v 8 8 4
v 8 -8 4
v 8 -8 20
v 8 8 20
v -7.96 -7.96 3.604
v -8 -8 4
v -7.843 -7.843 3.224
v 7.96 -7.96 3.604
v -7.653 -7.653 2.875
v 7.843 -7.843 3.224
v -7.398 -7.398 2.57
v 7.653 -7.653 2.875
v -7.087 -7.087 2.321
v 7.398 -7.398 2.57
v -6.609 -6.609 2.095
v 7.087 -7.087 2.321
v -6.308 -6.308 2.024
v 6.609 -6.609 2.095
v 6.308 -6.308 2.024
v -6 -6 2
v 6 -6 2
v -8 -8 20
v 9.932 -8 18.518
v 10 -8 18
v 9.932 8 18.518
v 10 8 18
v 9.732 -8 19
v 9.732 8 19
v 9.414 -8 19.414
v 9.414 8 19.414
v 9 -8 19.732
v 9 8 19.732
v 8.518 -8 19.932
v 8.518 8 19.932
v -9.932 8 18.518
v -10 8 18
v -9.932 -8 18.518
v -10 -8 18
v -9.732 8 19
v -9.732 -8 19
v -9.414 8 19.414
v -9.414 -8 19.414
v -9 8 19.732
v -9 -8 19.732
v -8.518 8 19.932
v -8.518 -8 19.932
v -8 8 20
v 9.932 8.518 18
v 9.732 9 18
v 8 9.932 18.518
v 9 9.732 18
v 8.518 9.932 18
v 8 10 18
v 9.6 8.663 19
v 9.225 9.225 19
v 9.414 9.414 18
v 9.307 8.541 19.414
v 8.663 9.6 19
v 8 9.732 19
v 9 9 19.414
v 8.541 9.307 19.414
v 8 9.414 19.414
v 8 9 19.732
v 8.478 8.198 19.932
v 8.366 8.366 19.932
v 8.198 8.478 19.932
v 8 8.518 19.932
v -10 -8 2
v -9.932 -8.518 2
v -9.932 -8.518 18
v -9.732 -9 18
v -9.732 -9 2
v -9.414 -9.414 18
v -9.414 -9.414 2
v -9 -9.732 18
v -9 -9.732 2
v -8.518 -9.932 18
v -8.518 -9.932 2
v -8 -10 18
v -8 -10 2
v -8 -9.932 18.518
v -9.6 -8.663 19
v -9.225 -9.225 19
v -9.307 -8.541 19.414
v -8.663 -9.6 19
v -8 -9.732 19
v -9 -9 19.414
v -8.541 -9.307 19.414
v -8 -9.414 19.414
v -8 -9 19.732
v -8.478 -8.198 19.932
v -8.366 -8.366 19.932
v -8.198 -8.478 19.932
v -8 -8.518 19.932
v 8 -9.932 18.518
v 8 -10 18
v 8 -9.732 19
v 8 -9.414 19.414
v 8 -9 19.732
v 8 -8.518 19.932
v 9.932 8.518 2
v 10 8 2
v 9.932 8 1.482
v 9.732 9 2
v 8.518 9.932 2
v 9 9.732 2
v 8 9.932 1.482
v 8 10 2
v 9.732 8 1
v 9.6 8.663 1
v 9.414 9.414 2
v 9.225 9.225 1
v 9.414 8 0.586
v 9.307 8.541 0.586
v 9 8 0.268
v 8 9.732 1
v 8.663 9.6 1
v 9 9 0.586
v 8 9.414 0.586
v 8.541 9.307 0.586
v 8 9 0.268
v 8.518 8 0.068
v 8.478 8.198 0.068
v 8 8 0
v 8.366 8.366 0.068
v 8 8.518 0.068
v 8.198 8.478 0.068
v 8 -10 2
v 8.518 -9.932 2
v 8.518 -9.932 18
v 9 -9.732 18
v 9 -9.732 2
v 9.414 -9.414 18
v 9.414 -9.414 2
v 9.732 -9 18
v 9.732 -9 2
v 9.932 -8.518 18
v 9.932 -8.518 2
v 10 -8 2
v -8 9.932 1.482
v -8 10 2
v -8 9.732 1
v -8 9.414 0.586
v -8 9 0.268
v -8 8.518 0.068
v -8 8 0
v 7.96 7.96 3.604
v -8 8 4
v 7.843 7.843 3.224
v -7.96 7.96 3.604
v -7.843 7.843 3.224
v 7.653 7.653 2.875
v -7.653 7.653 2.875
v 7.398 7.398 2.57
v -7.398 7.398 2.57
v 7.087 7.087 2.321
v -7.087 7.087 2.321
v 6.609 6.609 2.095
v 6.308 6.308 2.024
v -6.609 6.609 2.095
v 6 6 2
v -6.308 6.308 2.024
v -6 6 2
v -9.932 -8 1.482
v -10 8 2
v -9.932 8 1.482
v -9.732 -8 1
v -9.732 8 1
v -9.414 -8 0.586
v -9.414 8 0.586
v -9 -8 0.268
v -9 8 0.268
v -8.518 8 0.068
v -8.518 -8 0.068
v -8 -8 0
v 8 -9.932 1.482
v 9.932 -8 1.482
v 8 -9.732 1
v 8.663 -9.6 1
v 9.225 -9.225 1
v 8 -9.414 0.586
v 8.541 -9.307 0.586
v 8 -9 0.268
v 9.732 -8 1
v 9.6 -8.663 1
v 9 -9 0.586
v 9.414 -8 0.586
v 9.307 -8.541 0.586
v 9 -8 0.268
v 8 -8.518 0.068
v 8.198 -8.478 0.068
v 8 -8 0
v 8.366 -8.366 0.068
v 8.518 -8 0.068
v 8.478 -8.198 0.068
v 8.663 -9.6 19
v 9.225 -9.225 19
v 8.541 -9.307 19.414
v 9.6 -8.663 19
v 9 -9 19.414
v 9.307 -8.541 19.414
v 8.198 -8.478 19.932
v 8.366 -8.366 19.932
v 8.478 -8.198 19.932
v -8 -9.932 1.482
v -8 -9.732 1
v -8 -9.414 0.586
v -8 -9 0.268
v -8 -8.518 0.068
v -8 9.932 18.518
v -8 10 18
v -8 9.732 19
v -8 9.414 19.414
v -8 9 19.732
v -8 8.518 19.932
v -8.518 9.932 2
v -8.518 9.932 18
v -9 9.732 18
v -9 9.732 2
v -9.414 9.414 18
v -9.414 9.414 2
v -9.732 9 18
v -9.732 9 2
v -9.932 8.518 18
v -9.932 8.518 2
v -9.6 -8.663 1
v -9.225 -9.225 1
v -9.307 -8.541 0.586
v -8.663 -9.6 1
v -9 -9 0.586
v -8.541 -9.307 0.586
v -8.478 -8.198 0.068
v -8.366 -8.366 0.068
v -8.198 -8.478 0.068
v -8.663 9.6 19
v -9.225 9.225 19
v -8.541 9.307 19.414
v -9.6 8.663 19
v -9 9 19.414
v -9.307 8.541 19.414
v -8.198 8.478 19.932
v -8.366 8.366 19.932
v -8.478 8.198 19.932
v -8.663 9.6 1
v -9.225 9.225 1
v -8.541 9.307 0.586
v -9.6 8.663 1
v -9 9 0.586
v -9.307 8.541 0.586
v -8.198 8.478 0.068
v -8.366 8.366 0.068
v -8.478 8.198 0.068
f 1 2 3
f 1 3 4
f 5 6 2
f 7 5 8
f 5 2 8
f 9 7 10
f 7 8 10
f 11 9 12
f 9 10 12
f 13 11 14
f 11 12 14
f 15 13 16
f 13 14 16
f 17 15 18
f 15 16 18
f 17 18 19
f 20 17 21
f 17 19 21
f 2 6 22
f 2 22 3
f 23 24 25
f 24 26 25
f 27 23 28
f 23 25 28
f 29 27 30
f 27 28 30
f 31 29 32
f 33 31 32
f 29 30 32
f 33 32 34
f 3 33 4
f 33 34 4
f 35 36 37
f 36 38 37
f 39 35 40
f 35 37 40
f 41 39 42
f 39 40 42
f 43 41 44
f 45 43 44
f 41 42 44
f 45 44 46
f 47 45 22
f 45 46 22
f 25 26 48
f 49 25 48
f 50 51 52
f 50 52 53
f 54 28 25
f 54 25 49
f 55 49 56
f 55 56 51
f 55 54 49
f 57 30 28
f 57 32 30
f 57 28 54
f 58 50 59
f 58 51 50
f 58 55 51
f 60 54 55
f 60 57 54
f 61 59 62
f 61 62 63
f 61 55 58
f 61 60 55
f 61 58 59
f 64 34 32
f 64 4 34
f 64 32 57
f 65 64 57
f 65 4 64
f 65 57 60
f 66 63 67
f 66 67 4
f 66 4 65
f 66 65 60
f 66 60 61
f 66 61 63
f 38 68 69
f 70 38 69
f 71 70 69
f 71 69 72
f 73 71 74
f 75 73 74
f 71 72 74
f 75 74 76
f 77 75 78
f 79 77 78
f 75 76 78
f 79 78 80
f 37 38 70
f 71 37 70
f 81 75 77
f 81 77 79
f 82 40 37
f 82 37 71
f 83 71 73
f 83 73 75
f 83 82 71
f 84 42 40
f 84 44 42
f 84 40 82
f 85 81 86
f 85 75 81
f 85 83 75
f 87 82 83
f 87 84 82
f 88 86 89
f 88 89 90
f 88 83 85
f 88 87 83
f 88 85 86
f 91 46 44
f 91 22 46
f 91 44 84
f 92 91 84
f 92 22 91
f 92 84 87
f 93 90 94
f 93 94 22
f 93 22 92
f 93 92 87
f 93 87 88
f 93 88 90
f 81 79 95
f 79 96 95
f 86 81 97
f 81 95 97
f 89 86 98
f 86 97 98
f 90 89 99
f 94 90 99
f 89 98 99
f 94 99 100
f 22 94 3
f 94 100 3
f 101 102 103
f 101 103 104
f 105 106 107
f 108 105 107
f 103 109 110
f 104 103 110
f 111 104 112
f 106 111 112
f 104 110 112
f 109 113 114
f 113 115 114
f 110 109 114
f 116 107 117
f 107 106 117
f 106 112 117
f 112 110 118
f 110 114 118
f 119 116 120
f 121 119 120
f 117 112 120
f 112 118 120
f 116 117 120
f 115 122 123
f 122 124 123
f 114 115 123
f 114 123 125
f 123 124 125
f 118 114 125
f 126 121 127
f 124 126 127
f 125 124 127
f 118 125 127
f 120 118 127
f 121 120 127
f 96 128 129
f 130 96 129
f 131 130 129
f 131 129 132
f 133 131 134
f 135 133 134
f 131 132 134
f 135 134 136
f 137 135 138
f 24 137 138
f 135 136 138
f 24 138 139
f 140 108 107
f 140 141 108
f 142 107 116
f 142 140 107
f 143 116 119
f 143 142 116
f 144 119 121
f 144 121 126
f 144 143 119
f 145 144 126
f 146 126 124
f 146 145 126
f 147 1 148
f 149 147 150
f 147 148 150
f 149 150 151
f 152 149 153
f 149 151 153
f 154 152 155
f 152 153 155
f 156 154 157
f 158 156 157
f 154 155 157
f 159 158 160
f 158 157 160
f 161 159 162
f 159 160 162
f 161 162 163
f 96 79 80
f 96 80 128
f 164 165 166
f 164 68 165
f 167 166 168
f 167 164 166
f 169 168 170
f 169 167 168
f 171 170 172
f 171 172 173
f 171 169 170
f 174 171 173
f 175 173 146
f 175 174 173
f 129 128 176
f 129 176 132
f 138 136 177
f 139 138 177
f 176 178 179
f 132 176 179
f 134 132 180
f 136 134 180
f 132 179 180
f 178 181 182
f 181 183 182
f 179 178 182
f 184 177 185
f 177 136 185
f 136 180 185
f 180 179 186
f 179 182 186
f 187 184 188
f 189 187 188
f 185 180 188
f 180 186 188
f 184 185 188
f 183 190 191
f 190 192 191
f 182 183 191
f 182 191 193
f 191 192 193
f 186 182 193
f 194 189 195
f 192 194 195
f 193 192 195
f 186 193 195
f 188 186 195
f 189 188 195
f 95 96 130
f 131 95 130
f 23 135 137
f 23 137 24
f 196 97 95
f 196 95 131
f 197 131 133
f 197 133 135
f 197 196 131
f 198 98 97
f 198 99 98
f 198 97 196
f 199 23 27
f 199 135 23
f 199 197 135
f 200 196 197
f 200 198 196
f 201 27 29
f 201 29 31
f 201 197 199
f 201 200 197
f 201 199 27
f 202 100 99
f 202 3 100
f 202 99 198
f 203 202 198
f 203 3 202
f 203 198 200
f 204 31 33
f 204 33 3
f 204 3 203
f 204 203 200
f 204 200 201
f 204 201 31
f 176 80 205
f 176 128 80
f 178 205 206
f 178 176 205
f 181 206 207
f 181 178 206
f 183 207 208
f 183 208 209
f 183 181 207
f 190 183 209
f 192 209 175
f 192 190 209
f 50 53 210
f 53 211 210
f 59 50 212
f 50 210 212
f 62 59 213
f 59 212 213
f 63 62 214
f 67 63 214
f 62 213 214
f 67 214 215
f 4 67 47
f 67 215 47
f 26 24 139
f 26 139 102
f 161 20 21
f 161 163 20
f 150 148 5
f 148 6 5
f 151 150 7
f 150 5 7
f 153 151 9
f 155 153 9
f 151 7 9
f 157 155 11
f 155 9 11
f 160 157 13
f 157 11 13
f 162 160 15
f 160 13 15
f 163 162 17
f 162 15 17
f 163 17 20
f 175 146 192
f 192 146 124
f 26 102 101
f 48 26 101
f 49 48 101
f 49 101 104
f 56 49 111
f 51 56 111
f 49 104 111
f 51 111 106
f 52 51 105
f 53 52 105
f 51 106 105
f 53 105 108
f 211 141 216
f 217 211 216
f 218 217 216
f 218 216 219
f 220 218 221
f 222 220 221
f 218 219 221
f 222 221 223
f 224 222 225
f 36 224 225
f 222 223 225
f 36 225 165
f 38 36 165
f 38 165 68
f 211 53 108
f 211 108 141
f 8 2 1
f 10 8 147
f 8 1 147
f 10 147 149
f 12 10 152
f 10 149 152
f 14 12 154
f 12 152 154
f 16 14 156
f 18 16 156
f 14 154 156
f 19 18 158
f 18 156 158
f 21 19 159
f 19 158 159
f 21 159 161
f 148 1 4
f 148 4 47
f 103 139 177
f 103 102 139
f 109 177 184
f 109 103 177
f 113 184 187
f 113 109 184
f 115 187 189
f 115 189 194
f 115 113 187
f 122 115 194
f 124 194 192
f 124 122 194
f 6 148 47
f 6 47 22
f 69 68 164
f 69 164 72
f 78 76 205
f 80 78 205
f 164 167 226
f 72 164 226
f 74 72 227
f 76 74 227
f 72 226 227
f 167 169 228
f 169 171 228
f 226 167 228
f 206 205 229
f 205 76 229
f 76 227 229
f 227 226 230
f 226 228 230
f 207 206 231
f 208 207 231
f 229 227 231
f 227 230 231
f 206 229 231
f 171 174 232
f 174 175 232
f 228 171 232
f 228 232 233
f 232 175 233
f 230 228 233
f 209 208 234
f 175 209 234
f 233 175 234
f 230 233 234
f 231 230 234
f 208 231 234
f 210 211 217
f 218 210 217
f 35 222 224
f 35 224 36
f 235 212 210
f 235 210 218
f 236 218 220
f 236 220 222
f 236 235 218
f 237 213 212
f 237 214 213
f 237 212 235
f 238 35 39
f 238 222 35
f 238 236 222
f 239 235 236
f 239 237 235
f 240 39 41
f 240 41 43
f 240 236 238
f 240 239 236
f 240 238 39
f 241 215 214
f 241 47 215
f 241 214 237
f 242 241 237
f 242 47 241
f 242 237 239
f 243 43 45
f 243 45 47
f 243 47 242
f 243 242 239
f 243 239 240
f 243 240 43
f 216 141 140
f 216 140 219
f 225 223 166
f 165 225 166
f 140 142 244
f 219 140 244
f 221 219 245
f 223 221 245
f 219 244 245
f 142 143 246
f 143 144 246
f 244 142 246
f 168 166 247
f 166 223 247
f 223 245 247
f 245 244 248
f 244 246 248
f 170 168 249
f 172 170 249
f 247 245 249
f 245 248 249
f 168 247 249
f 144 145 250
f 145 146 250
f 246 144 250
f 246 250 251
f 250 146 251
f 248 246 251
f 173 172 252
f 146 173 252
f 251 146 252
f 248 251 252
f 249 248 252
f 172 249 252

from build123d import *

# Parameters (mm, degrees)
F1_DEPTH = 20
F3_T     = 2
F4_R     = 1.99999


# Not quite as in the source:
# - a fillet or chamfer is up to 0.001 mm smaller than in the source, because OpenCascade refuses the exact size
# - a feature of the source that left no trace in its solid (it failed there, or was rolled back) is left out
# - a shell that OpenCascade refuses in one call is made with other operations: the cavity is built on its own and cut out


with BuildPart() as f1:
    # F0 (on Top) → F1 (new body)
    with BuildSketch(Plane.XY):
        with BuildLine():
            Line((-8, -10), (8, -10))
            ThreePointArc((8, -10), (9.4142135624, -9.4142135624), (10, -8))
            Line((10, -8), (10, 8))
            ThreePointArc((10, 8), (9.4142135624, 9.4142135624), (8, 10))
            Line((8, 10), (-8, 10))
            ThreePointArc((-8, 10), (-9.4142135624, 9.4142135624), (-10, 8))
            Line((-10, 8), (-10, -8))
            ThreePointArc((-10, -8), (-9.4142135624, -9.4142135624), (-8, -10))
        make_face()
    extrude(amount=F1_DEPTH)

    # F3: shell of thickness 2, made by hand


with BuildPart() as f3_core1:
    # F3_t2: copy of F1
    add(f1.part)

    # the walls: a layer under each face that stays
    f3_faces = [f3_core1.faces().sort_by_distance(p)[0] for p in [
        (0, -10, 10),
        (10, 0, 10),
        (0, 10, 10),
        (-10, 0, 10),
        (0, 0, 0),
    ]]
    thicken(f3_faces, amount=-F3_T, mode=Mode.SUBTRACT)


with BuildPart() as f1_1:
    add(f1.part)

    # what is left inside the walls is the cavity
    f3_cavity = [f3_core1.part.solids().sort_by_distance(p)[0] for p in [
        (0, -7.98, 14),
    ]]
    add(f3_cavity, mode=Mode.SUBTRACT)

    # F4 (radius 2 in the source; OpenCascade refuses exactly that, so slightly less here)
    f4_edges = [f1_1.edges().sort_by_distance(p)[0] for p in [
        (0, -10, 0),
        (0, -10, 20),
        (-9.414214, -9.414214, 0),
        (-9.414214, -9.414214, 20),
        (9.414214, -9.414214, 0),
        (9.414214, -9.414214, 20),
        (10, 0, 0),
        (9.414214, 9.414214, 0),
        (0, 10, 0),
        (-9.414214, 9.414214, 0),
        (-10, 0, 0),
        (-10, 0, 20),
        (10, 0, 20),
        (-9.414214, 9.414214, 20),
        (9.414214, 9.414214, 20),
        (0, 10, 20),
        (0, -8, 2),
        (8, 0, 2),
        (0, 8, 2),
        (-8, 0, 2),
    ]]
    fillet(f4_edges, radius=F4_R)


solid = f1_1.part
